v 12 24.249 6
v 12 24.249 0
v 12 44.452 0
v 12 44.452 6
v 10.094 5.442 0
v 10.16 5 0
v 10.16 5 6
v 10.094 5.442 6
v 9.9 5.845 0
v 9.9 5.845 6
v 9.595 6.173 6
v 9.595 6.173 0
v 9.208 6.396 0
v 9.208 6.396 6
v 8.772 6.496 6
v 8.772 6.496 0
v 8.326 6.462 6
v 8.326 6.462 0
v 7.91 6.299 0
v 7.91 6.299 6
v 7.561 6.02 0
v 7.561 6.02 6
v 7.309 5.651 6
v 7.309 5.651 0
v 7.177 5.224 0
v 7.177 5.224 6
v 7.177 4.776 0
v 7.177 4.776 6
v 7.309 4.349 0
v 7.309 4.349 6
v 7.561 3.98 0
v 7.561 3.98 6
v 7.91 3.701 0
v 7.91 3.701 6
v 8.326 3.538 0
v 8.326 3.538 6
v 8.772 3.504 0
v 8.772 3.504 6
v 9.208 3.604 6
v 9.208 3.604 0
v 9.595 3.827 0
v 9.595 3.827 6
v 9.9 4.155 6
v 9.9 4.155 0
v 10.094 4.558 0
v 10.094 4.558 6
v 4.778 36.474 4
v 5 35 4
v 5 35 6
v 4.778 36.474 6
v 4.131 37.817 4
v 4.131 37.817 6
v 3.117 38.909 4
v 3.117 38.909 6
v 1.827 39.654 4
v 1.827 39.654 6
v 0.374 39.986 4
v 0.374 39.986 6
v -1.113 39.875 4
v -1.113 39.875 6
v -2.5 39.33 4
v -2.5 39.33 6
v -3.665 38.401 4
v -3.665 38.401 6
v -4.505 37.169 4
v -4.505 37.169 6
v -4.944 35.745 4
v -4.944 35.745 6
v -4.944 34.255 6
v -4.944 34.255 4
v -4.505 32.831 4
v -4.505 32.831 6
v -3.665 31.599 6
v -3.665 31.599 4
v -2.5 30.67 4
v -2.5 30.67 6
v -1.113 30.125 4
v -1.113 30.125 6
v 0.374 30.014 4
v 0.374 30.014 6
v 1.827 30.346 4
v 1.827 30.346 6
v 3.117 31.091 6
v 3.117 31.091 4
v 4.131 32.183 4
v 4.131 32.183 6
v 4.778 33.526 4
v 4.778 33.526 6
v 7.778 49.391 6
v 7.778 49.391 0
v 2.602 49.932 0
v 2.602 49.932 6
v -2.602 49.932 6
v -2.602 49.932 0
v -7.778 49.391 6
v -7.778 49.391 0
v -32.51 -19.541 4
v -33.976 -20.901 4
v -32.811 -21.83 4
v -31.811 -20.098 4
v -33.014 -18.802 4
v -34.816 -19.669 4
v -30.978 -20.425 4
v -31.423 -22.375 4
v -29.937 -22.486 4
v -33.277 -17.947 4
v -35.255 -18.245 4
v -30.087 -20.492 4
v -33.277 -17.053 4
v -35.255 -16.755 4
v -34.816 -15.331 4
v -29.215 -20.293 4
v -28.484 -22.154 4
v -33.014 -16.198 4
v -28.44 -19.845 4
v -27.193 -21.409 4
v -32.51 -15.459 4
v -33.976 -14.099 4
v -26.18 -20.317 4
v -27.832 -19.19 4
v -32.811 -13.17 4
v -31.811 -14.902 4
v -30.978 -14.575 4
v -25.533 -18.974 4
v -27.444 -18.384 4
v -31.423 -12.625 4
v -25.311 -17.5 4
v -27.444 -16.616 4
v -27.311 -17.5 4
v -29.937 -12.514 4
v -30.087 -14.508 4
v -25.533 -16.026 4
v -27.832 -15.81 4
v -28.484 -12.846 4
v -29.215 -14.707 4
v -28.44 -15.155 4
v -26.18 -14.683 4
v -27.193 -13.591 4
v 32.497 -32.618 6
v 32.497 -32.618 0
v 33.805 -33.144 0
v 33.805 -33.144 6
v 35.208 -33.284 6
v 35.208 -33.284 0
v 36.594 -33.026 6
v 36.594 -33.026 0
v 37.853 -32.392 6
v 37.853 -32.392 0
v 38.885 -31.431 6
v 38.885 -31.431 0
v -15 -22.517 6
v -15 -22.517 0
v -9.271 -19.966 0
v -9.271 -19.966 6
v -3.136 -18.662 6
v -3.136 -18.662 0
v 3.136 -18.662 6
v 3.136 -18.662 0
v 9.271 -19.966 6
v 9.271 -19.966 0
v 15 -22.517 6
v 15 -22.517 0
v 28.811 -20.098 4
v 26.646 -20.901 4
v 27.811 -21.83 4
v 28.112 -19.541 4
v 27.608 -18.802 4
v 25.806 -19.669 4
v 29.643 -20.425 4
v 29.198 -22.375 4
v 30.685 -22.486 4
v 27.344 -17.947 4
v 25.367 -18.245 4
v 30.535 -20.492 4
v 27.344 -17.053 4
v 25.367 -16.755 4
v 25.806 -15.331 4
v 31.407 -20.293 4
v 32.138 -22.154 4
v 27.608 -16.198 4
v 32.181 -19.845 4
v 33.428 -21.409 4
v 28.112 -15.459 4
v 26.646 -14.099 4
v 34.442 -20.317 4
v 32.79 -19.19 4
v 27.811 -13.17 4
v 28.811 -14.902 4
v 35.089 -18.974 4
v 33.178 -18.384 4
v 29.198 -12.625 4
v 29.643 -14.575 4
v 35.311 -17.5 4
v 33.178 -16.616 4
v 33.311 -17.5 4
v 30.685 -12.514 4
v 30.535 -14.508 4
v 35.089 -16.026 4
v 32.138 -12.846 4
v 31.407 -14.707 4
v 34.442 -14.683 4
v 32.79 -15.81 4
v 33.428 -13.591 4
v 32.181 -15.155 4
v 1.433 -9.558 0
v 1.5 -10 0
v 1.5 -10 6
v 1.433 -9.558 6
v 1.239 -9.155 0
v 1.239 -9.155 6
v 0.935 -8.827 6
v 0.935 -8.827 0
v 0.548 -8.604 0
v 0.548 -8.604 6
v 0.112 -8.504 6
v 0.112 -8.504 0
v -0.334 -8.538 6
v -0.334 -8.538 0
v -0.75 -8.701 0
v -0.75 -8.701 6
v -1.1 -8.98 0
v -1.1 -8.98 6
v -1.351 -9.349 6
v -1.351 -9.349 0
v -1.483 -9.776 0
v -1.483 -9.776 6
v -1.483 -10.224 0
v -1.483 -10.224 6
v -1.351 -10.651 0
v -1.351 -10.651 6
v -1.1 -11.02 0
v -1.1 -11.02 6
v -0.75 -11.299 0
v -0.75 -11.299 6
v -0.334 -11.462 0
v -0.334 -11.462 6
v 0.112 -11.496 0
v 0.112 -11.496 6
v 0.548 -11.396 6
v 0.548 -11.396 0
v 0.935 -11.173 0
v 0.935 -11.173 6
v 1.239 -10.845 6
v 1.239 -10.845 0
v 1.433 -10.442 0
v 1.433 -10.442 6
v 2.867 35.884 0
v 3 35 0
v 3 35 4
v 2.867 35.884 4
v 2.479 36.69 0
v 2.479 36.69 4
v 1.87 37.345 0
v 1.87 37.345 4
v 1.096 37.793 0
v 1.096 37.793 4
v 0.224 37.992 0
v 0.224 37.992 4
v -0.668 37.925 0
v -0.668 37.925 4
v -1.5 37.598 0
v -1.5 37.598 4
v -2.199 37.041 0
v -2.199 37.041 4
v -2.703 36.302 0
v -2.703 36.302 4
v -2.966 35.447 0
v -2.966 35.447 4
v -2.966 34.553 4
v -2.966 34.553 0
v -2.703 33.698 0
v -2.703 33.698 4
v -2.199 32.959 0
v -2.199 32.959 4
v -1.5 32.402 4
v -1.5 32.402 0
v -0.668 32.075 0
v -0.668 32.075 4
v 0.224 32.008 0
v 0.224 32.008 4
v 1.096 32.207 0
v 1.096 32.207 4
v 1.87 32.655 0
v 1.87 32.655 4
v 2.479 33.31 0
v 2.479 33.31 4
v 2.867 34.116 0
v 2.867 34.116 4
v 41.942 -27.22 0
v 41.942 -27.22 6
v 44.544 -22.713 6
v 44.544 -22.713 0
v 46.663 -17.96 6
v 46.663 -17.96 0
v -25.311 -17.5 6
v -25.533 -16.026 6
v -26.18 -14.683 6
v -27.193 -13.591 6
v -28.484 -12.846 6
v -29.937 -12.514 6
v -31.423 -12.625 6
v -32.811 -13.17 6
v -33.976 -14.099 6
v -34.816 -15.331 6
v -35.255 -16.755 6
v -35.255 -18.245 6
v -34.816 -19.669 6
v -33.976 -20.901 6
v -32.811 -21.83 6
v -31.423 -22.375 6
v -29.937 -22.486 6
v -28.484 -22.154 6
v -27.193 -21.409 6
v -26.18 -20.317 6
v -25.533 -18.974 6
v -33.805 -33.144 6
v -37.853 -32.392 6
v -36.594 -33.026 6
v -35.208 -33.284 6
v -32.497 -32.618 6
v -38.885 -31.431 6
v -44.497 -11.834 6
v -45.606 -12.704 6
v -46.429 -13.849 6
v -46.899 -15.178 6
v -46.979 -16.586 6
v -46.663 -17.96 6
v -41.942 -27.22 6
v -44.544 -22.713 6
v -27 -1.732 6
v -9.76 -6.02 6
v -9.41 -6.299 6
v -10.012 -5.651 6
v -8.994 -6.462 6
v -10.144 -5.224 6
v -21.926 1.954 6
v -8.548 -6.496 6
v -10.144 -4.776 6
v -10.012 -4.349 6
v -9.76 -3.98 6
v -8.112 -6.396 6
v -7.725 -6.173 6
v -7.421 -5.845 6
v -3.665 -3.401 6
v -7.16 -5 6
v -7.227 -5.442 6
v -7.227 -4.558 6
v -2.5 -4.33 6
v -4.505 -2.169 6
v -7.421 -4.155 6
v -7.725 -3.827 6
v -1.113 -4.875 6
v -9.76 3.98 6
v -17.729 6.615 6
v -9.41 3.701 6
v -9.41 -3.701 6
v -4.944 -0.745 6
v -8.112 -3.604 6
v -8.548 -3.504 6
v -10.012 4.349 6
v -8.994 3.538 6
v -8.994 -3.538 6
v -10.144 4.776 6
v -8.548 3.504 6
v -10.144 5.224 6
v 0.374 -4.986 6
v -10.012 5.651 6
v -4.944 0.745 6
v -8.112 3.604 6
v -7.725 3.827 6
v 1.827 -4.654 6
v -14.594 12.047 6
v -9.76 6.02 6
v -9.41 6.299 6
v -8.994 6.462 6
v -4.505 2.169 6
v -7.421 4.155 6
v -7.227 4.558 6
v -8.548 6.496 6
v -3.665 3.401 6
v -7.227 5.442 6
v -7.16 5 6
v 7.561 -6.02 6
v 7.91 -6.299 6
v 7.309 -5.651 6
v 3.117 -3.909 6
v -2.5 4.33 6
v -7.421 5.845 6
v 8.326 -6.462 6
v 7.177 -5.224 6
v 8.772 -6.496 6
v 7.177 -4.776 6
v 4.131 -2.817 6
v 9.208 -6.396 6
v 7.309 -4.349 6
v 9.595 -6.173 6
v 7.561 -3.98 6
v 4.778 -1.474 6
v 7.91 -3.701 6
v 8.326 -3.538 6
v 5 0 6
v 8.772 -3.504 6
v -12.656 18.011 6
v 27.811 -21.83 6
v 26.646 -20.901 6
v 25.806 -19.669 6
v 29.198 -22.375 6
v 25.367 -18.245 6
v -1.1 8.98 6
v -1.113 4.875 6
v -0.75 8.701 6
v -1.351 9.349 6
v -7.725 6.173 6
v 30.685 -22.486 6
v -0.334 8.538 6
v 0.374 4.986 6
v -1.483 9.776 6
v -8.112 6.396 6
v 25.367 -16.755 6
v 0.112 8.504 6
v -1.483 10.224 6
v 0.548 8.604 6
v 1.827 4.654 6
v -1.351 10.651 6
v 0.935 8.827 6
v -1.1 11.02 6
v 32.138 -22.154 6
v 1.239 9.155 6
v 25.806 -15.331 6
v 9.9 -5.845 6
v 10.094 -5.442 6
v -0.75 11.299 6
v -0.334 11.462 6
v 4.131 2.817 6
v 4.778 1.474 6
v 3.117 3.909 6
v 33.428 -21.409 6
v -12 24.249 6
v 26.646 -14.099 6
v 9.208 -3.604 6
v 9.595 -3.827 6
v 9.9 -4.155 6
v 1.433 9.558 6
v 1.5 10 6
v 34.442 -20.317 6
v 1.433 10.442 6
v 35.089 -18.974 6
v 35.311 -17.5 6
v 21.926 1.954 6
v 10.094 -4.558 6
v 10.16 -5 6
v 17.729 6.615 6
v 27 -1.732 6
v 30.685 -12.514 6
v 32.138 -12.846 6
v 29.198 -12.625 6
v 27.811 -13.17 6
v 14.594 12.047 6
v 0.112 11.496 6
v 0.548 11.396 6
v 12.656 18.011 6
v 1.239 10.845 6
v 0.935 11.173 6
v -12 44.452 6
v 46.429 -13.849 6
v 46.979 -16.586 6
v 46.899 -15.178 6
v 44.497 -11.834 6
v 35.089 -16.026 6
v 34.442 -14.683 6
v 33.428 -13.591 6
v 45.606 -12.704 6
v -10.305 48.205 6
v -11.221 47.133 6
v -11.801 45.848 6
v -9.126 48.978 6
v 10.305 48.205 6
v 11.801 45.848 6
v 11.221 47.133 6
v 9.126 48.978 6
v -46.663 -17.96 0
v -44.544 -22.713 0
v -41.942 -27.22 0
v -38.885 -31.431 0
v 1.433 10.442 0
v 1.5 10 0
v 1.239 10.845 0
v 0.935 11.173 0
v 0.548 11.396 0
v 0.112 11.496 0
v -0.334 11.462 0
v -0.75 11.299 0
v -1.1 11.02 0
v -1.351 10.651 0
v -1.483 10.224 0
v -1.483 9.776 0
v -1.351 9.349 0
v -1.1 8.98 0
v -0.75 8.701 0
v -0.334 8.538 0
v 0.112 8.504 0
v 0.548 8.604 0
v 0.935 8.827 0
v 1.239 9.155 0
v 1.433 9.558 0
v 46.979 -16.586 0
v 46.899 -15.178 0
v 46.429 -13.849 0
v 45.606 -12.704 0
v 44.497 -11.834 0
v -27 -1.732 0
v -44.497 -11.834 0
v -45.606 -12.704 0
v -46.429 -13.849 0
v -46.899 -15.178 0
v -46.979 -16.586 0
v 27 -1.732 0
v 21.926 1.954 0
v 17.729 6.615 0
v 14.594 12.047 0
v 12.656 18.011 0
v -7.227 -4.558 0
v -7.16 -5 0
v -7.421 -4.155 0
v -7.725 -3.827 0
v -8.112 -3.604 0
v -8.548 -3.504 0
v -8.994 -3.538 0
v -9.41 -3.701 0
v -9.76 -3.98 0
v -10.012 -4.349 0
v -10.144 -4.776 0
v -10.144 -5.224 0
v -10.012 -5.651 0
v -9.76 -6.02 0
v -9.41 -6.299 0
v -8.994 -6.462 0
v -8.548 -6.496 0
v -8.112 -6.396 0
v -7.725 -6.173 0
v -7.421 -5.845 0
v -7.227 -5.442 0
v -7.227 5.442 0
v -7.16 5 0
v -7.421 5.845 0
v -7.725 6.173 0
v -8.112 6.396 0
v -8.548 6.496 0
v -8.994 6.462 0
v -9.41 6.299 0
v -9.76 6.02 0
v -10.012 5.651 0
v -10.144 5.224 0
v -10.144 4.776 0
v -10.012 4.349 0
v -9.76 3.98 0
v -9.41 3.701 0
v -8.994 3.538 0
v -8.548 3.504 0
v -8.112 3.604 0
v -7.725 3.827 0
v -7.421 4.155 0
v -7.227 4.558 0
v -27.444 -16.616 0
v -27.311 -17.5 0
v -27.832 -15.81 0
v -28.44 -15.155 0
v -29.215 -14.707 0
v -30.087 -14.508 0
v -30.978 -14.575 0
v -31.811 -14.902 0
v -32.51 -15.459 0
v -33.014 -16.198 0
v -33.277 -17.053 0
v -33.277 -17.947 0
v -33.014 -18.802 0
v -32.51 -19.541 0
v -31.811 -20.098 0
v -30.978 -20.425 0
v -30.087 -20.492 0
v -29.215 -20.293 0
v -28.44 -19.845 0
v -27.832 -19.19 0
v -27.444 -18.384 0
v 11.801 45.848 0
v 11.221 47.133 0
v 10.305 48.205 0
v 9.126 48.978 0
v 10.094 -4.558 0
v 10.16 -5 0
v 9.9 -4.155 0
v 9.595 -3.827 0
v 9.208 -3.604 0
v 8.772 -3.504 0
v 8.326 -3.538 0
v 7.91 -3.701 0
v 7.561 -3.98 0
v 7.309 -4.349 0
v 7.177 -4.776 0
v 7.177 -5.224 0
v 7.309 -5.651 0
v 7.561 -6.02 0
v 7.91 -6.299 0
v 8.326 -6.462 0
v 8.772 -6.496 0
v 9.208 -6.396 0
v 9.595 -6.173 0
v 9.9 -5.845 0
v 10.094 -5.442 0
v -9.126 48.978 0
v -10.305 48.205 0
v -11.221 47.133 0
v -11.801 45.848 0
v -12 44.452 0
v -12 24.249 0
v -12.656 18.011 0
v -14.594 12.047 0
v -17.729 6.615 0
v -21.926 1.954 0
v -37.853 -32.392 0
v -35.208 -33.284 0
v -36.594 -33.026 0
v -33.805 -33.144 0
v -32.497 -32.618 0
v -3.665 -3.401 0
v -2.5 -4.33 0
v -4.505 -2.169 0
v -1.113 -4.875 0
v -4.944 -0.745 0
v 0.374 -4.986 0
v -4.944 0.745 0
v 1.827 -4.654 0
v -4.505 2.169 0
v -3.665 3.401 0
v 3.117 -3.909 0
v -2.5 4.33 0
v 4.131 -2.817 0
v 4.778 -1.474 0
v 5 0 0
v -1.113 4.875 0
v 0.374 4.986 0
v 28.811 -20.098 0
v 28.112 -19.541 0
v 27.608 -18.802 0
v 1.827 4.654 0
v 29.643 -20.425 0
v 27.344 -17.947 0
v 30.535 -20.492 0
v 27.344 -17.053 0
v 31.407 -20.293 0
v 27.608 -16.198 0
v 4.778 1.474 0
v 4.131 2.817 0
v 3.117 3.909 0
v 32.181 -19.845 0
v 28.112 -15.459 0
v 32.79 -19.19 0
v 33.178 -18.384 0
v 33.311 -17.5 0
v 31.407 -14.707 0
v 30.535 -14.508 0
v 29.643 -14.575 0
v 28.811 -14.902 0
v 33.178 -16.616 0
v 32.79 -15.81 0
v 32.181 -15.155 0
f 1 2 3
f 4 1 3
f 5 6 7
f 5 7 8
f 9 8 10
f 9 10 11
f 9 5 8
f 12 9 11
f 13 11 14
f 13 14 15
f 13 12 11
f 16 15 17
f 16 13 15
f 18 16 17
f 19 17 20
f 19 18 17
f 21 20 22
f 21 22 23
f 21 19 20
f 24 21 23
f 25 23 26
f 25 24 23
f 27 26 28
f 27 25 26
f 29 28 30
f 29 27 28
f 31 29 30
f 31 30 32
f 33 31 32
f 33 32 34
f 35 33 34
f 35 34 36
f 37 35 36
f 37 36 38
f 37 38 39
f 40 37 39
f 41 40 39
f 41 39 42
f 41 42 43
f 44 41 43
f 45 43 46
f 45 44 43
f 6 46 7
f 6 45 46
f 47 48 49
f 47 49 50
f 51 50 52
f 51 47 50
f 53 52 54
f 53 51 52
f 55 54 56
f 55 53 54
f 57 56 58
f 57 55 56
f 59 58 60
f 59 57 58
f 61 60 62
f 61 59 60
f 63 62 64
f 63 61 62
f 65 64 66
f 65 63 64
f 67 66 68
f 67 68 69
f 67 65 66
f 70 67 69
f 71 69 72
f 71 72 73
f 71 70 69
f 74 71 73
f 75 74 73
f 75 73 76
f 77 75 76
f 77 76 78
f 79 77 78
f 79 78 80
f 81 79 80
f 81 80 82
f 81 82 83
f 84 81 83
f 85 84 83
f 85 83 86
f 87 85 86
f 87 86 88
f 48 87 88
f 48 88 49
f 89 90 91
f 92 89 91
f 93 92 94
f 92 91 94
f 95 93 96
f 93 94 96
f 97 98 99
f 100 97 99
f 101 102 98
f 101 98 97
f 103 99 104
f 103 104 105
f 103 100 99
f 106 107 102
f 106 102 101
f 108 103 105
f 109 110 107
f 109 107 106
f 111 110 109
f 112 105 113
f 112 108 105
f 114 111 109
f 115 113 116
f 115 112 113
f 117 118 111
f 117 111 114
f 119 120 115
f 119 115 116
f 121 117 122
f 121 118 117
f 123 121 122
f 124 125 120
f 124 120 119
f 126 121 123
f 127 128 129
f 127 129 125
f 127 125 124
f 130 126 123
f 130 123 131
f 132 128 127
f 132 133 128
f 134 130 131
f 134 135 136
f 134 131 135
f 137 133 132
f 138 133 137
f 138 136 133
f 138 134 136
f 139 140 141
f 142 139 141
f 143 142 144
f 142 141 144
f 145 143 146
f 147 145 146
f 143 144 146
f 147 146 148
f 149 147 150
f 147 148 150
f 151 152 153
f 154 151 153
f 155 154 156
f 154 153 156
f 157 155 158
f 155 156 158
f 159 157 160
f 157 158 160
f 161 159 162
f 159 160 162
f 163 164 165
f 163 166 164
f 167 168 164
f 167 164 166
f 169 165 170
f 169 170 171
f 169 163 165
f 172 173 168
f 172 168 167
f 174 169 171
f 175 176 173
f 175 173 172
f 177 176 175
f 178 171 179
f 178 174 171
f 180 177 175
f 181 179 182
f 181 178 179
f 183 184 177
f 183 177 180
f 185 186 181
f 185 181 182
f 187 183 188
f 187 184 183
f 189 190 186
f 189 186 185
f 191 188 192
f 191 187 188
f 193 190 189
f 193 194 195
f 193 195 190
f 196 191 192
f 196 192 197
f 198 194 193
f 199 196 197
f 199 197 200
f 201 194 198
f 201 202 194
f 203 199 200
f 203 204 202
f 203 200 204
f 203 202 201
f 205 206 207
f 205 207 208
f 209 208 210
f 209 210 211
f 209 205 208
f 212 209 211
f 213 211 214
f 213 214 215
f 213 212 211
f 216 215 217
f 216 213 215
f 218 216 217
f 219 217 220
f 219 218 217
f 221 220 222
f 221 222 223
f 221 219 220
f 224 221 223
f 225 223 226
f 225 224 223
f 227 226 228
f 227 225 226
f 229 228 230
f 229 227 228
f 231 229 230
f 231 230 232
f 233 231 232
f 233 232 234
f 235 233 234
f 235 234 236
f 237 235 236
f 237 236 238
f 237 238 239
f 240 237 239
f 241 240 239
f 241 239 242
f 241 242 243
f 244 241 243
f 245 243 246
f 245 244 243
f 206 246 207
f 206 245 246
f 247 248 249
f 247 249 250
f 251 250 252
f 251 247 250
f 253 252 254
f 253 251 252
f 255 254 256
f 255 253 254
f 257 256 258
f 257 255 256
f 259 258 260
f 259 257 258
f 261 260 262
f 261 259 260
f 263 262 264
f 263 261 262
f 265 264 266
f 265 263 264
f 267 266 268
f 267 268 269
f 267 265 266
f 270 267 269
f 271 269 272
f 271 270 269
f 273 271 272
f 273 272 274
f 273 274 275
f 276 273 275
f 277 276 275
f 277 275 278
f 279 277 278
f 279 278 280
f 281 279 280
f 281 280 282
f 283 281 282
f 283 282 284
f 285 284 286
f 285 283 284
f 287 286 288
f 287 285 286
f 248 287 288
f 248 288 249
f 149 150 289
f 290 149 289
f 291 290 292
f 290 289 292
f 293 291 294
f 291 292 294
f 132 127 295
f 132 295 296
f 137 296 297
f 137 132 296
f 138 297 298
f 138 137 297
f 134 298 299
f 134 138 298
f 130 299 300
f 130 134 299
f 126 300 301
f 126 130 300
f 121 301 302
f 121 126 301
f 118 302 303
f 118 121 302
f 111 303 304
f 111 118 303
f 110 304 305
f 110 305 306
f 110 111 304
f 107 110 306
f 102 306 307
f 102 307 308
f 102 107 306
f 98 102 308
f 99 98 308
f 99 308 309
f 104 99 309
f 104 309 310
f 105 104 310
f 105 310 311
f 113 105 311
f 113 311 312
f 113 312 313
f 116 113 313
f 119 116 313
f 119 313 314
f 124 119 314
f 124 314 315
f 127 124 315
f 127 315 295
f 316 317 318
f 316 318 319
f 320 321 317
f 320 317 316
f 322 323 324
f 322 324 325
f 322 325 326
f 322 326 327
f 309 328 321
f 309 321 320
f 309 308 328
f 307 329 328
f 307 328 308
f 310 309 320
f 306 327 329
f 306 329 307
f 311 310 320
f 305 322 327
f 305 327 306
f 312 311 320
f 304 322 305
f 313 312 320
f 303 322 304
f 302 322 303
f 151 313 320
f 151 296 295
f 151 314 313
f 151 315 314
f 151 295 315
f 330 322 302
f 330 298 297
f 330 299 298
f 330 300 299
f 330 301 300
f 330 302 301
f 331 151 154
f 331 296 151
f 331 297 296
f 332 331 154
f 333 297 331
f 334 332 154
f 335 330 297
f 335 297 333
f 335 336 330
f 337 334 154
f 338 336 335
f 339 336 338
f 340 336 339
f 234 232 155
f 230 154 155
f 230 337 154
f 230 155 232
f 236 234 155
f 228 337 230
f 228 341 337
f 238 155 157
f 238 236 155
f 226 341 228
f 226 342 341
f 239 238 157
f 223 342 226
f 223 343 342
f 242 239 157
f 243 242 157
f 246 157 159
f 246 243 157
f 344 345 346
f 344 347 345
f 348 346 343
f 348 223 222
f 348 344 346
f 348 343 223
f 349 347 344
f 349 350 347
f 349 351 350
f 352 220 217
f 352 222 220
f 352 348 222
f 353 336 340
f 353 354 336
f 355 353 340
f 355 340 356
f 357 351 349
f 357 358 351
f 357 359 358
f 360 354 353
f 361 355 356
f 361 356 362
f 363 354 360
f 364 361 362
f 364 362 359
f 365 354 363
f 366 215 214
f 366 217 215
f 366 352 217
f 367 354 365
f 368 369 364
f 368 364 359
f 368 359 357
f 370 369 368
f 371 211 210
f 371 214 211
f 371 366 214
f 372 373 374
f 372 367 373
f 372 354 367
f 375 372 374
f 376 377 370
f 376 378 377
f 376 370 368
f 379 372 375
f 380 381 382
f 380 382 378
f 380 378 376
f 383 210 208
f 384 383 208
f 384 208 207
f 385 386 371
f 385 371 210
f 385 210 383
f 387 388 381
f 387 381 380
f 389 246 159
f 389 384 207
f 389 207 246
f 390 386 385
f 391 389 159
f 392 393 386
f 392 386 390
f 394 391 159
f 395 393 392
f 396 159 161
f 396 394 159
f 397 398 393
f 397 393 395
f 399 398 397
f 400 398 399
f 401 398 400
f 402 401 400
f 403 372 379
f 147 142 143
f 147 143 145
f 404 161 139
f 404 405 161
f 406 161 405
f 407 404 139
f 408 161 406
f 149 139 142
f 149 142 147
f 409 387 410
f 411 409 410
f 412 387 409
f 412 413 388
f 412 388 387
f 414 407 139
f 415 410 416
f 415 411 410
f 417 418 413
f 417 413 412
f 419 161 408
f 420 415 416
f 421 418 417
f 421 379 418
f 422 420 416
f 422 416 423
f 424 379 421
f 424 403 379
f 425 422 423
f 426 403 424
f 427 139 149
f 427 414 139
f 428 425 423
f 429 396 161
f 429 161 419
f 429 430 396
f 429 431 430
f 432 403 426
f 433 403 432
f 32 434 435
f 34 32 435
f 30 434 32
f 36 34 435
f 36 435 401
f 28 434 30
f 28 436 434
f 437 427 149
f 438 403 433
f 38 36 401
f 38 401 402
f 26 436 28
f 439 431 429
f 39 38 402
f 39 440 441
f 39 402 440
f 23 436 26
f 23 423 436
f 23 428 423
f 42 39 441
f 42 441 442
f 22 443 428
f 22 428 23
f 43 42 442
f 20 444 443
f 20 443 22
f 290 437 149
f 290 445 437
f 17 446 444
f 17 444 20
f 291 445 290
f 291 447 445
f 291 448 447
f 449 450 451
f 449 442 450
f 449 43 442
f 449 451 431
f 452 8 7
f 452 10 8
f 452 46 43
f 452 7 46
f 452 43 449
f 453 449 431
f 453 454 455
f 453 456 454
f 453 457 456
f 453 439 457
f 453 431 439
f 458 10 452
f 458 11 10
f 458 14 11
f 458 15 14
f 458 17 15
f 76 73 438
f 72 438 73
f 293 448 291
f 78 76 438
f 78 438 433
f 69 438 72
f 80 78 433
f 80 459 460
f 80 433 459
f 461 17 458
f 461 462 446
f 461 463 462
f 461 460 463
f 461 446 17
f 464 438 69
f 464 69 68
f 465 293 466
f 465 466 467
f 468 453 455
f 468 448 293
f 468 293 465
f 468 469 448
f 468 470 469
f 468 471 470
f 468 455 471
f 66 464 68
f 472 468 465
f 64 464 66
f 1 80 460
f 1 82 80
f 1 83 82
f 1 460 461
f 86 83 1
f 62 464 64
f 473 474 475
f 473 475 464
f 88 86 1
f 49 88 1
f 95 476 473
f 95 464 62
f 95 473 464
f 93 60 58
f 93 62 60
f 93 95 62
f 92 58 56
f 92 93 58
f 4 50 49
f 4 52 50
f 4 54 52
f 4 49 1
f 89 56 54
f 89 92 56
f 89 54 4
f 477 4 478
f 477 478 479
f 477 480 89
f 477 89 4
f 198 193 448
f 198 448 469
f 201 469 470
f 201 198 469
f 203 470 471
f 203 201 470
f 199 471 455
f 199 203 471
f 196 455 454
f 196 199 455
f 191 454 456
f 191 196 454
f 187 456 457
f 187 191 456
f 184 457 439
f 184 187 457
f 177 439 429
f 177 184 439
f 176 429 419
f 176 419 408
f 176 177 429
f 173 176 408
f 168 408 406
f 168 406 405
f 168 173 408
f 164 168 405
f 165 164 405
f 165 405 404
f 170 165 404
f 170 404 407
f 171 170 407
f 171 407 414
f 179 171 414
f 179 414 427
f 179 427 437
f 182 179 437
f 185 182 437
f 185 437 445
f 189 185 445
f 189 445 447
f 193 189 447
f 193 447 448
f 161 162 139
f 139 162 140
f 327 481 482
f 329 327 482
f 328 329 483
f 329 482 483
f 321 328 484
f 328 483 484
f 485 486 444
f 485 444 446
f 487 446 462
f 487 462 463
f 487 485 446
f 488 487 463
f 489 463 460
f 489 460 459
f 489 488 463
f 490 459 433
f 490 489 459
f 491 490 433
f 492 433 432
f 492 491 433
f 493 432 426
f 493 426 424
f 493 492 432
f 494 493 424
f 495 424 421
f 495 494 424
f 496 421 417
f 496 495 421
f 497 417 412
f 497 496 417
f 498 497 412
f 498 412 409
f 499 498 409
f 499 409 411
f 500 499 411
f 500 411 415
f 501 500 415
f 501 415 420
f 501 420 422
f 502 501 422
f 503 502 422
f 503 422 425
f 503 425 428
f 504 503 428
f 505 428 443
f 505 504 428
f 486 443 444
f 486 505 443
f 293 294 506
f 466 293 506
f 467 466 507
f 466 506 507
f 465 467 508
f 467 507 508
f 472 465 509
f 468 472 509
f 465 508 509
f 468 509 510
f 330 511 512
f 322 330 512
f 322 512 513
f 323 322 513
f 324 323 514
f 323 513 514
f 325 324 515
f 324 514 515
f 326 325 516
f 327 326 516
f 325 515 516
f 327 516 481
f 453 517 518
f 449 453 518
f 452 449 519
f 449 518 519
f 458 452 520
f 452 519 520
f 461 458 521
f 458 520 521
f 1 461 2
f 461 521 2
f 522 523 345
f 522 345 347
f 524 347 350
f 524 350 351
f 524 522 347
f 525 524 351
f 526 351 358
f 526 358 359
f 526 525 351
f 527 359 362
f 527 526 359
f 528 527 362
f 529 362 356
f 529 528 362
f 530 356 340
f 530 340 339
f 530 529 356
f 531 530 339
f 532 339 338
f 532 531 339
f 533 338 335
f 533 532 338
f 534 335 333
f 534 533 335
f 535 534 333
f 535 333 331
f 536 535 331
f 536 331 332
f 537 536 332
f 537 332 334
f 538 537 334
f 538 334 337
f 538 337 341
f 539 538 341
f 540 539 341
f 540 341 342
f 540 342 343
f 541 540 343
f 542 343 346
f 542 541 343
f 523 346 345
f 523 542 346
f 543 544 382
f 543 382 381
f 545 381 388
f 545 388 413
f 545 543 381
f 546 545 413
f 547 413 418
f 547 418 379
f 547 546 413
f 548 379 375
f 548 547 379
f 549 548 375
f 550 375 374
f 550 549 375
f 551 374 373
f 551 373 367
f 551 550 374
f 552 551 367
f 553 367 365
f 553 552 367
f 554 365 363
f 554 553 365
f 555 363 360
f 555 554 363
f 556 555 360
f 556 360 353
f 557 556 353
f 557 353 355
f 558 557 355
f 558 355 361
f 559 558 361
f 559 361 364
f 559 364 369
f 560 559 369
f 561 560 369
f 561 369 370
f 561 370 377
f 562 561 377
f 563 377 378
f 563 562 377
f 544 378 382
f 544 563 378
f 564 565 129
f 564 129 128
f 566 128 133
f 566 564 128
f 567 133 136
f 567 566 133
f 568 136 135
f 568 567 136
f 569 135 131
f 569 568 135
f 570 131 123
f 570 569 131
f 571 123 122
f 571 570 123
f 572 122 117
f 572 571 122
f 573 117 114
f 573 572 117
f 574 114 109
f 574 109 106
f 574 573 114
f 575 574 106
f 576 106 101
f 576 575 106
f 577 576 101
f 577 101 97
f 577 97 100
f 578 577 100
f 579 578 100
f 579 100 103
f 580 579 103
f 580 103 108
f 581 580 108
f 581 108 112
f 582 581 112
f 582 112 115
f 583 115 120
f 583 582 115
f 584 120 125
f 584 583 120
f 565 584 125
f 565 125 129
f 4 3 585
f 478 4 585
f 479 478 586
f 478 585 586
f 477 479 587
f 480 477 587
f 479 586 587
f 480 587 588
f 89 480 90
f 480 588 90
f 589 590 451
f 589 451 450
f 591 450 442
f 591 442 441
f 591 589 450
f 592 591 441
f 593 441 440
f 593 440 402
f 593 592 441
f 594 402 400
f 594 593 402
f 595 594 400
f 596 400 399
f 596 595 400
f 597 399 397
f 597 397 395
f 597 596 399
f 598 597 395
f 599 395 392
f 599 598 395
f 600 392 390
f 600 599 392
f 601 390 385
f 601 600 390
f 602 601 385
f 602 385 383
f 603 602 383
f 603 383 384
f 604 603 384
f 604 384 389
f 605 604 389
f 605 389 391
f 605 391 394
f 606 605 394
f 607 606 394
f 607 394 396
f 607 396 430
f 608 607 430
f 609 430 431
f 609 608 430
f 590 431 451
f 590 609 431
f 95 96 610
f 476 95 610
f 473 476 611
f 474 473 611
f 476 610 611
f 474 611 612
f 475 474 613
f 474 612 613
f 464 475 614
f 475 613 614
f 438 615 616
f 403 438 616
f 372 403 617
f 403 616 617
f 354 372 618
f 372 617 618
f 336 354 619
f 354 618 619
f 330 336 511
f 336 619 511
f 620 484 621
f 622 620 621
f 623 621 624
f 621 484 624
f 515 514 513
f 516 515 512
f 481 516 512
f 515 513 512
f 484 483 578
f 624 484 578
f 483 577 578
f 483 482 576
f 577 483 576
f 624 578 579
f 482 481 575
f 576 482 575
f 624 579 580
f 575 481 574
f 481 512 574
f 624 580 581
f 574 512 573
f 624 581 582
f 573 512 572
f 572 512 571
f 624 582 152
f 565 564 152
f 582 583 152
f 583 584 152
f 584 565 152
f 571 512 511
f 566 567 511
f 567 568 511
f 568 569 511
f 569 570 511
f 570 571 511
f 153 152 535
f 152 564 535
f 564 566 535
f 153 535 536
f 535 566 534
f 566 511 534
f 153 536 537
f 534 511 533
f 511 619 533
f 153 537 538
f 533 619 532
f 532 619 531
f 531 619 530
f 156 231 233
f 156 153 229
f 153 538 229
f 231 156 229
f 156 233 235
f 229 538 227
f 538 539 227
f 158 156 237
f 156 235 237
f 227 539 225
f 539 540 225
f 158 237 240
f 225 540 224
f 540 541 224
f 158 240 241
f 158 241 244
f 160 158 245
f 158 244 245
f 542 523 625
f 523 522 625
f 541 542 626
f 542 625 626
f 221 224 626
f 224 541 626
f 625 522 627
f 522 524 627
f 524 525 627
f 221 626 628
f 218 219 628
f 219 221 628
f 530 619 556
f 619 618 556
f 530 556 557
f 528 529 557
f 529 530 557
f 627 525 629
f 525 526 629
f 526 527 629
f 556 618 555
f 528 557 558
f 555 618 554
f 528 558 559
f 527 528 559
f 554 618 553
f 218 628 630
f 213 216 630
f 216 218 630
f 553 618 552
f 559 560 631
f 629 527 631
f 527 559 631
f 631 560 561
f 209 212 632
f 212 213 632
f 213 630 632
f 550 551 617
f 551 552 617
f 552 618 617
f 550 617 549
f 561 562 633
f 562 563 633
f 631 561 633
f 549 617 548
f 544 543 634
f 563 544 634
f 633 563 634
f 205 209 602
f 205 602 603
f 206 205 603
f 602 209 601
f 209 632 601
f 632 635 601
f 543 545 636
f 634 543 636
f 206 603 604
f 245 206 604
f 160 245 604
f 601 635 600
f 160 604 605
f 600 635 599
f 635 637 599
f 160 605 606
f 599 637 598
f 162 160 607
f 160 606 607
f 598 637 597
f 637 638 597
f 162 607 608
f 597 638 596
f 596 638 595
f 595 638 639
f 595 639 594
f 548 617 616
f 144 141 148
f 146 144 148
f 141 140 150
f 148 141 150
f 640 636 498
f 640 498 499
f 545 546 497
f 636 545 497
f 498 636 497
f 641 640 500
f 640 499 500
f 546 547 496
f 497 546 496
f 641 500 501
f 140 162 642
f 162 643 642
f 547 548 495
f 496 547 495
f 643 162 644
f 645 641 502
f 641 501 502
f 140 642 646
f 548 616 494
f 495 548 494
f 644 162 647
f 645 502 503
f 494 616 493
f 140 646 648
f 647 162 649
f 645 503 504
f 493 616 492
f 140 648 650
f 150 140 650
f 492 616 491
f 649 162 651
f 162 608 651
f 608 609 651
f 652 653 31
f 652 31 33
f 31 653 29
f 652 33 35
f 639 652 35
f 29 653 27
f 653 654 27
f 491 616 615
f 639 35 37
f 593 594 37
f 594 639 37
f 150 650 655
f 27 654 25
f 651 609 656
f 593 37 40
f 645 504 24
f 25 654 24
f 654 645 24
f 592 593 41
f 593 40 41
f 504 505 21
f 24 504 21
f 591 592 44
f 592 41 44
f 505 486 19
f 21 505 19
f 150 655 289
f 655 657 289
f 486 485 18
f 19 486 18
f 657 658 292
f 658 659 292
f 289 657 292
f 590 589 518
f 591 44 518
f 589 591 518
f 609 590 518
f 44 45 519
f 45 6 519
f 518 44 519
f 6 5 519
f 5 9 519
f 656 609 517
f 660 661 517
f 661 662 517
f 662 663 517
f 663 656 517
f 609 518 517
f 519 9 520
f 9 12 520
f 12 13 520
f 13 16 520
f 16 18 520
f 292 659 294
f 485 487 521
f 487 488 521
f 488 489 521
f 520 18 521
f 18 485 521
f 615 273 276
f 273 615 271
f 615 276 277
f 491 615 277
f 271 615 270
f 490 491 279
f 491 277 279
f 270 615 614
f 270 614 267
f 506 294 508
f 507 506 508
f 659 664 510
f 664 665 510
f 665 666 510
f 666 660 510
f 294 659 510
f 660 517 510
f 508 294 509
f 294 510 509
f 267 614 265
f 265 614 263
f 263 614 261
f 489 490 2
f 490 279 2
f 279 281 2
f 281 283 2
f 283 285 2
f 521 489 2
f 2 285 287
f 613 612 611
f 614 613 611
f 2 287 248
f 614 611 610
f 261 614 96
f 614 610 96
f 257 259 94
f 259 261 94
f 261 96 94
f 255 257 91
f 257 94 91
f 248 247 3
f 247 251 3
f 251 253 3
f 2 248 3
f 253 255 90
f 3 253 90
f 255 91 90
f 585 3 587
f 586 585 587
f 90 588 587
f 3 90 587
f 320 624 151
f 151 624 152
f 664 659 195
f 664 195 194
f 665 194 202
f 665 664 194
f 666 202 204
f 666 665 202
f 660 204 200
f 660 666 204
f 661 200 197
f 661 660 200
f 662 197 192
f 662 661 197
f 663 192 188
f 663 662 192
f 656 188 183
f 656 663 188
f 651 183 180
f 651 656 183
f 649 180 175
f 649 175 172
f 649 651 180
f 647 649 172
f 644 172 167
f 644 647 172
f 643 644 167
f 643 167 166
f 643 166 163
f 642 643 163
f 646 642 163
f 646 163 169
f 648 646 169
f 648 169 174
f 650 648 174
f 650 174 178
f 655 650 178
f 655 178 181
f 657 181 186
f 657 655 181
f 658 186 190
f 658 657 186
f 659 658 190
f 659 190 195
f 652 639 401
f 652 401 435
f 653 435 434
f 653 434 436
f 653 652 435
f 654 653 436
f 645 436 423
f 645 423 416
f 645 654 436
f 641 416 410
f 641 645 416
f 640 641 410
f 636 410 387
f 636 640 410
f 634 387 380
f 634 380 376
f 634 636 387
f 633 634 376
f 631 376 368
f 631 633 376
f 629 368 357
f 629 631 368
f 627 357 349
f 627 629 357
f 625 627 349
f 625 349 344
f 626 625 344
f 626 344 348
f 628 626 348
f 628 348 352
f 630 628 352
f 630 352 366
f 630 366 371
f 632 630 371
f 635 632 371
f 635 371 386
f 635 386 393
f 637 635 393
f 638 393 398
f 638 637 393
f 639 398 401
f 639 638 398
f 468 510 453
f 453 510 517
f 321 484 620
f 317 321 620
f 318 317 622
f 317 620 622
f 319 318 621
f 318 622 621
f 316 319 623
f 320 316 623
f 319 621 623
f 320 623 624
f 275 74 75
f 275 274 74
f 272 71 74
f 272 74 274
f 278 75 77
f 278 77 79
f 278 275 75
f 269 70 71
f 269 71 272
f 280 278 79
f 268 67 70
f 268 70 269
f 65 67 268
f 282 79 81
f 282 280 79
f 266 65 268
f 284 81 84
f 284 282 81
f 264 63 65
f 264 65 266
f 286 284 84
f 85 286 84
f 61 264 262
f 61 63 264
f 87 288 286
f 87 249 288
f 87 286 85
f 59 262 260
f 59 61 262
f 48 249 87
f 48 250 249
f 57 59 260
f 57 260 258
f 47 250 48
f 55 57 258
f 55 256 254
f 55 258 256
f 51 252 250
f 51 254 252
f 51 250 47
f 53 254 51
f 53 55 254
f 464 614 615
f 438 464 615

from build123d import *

# Parameters (mm, degrees)
F0_R     = 5
F0_R_2   = 1.5
F1_DEPTH = 6
F0_R_3   = 3
F2_DEPTH = 4


with BuildPart() as f1:
    # F0 (on Top) → F1 (new body)
    with BuildSketch(Plane.XY):
        with BuildLine():
            ThreePointArc((-44.496753, -11.833806), (-46.710703, -14.496996), (-46.663059, -17.959925))
            ThreePointArc((-46.663059, -17.959925), (-43.30127, -25), (-38.885281, -31.431432))
            ThreePointArc((-38.885281, -31.431432), (-35.910118, -33.204157), (-32.496753, -32.618416))
            Line((-32.496753, -32.618416), (-15, -22.51666))
            ThreePointArc((-15, -22.51666), (0, -18.497423), (15, -22.51666))
            Line((15, -22.51666), (32.496753, -32.618416))
            ThreePointArc((32.496753, -32.618416), (35.910118, -33.204157), (38.885281, -31.431432))
            ThreePointArc((38.885281, -31.431432), (43.30127, -25), (46.663059, -17.959925))
            ThreePointArc((46.663059, -17.959925), (46.710703, -14.496996), (44.496753, -11.833806))
            Line((44.496753, -11.833806), (27, -1.732051))
            ThreePointArc((27, -1.732051), (16.019238, 9.248711), (12, 24.248711))
            Line((12, 24.248711), (12, 44.452222))
            ThreePointArc((12, 44.452222), (10.800585, 47.701153), (7.777778, 49.391357))
            ThreePointArc((7.777778, 49.391357), (0, 50), (-7.777778, 49.391357))
            ThreePointArc((-7.777778, 49.391357), (-10.800585, 47.701153), (-12, 44.452222))
            Line((-12, 44.452222), (-12, 24.248711))
            ThreePointArc((-12, 24.248711), (-16.019238, 9.248711), (-27, -1.732051))
            Line((-27, -1.732051), (-44.496753, -11.833806))
        make_face()
        with Locations((-30.310889, -17.5)):
            Circle(F0_R, mode=Mode.SUBTRACT)
        with Locations((-8.660254, -5)):
            Circle(F0_R_2, mode=Mode.SUBTRACT)
        with Locations((-8.660254, 5)):
            Circle(F0_R_2, mode=Mode.SUBTRACT)
        with Locations((30.310889, -17.5)):
            Circle(F0_R, mode=Mode.SUBTRACT)
        with Locations((0, -10)):
            Circle(F0_R_2, mode=Mode.SUBTRACT)
        with Locations((8.660254, -5)):
            Circle(F0_R_2, mode=Mode.SUBTRACT)
        Circle(F0_R, mode=Mode.SUBTRACT)
        with Locations((8.660254, 5)):
            Circle(F0_R_2, mode=Mode.SUBTRACT)
        with Locations((0, 10)):
            Circle(F0_R_2, mode=Mode.SUBTRACT)
        with Locations((0, 35)):
            Circle(F0_R, mode=Mode.SUBTRACT)
    extrude(amount=F1_DEPTH)

    # F0 (on Top) → F2 (join)
    with BuildSketch(Plane.XY):
        with Locations((-30.310889, -17.5)):
            Circle(F0_R)
        with Locations((-30.310889, -17.5)):
            Circle(F0_R_3, mode=Mode.SUBTRACT)
        with Locations((0, 35)):
            Circle(F0_R)
        with Locations((0, 35)):
            Circle(F0_R_3, mode=Mode.SUBTRACT)
        with Locations((30.310889, -17.5)):
            Circle(F0_R)
        with Locations((30.310889, -17.5)):
            Circle(F0_R_3, mode=Mode.SUBTRACT)
    extrude(amount=F2_DEPTH)


solid = f1.part
